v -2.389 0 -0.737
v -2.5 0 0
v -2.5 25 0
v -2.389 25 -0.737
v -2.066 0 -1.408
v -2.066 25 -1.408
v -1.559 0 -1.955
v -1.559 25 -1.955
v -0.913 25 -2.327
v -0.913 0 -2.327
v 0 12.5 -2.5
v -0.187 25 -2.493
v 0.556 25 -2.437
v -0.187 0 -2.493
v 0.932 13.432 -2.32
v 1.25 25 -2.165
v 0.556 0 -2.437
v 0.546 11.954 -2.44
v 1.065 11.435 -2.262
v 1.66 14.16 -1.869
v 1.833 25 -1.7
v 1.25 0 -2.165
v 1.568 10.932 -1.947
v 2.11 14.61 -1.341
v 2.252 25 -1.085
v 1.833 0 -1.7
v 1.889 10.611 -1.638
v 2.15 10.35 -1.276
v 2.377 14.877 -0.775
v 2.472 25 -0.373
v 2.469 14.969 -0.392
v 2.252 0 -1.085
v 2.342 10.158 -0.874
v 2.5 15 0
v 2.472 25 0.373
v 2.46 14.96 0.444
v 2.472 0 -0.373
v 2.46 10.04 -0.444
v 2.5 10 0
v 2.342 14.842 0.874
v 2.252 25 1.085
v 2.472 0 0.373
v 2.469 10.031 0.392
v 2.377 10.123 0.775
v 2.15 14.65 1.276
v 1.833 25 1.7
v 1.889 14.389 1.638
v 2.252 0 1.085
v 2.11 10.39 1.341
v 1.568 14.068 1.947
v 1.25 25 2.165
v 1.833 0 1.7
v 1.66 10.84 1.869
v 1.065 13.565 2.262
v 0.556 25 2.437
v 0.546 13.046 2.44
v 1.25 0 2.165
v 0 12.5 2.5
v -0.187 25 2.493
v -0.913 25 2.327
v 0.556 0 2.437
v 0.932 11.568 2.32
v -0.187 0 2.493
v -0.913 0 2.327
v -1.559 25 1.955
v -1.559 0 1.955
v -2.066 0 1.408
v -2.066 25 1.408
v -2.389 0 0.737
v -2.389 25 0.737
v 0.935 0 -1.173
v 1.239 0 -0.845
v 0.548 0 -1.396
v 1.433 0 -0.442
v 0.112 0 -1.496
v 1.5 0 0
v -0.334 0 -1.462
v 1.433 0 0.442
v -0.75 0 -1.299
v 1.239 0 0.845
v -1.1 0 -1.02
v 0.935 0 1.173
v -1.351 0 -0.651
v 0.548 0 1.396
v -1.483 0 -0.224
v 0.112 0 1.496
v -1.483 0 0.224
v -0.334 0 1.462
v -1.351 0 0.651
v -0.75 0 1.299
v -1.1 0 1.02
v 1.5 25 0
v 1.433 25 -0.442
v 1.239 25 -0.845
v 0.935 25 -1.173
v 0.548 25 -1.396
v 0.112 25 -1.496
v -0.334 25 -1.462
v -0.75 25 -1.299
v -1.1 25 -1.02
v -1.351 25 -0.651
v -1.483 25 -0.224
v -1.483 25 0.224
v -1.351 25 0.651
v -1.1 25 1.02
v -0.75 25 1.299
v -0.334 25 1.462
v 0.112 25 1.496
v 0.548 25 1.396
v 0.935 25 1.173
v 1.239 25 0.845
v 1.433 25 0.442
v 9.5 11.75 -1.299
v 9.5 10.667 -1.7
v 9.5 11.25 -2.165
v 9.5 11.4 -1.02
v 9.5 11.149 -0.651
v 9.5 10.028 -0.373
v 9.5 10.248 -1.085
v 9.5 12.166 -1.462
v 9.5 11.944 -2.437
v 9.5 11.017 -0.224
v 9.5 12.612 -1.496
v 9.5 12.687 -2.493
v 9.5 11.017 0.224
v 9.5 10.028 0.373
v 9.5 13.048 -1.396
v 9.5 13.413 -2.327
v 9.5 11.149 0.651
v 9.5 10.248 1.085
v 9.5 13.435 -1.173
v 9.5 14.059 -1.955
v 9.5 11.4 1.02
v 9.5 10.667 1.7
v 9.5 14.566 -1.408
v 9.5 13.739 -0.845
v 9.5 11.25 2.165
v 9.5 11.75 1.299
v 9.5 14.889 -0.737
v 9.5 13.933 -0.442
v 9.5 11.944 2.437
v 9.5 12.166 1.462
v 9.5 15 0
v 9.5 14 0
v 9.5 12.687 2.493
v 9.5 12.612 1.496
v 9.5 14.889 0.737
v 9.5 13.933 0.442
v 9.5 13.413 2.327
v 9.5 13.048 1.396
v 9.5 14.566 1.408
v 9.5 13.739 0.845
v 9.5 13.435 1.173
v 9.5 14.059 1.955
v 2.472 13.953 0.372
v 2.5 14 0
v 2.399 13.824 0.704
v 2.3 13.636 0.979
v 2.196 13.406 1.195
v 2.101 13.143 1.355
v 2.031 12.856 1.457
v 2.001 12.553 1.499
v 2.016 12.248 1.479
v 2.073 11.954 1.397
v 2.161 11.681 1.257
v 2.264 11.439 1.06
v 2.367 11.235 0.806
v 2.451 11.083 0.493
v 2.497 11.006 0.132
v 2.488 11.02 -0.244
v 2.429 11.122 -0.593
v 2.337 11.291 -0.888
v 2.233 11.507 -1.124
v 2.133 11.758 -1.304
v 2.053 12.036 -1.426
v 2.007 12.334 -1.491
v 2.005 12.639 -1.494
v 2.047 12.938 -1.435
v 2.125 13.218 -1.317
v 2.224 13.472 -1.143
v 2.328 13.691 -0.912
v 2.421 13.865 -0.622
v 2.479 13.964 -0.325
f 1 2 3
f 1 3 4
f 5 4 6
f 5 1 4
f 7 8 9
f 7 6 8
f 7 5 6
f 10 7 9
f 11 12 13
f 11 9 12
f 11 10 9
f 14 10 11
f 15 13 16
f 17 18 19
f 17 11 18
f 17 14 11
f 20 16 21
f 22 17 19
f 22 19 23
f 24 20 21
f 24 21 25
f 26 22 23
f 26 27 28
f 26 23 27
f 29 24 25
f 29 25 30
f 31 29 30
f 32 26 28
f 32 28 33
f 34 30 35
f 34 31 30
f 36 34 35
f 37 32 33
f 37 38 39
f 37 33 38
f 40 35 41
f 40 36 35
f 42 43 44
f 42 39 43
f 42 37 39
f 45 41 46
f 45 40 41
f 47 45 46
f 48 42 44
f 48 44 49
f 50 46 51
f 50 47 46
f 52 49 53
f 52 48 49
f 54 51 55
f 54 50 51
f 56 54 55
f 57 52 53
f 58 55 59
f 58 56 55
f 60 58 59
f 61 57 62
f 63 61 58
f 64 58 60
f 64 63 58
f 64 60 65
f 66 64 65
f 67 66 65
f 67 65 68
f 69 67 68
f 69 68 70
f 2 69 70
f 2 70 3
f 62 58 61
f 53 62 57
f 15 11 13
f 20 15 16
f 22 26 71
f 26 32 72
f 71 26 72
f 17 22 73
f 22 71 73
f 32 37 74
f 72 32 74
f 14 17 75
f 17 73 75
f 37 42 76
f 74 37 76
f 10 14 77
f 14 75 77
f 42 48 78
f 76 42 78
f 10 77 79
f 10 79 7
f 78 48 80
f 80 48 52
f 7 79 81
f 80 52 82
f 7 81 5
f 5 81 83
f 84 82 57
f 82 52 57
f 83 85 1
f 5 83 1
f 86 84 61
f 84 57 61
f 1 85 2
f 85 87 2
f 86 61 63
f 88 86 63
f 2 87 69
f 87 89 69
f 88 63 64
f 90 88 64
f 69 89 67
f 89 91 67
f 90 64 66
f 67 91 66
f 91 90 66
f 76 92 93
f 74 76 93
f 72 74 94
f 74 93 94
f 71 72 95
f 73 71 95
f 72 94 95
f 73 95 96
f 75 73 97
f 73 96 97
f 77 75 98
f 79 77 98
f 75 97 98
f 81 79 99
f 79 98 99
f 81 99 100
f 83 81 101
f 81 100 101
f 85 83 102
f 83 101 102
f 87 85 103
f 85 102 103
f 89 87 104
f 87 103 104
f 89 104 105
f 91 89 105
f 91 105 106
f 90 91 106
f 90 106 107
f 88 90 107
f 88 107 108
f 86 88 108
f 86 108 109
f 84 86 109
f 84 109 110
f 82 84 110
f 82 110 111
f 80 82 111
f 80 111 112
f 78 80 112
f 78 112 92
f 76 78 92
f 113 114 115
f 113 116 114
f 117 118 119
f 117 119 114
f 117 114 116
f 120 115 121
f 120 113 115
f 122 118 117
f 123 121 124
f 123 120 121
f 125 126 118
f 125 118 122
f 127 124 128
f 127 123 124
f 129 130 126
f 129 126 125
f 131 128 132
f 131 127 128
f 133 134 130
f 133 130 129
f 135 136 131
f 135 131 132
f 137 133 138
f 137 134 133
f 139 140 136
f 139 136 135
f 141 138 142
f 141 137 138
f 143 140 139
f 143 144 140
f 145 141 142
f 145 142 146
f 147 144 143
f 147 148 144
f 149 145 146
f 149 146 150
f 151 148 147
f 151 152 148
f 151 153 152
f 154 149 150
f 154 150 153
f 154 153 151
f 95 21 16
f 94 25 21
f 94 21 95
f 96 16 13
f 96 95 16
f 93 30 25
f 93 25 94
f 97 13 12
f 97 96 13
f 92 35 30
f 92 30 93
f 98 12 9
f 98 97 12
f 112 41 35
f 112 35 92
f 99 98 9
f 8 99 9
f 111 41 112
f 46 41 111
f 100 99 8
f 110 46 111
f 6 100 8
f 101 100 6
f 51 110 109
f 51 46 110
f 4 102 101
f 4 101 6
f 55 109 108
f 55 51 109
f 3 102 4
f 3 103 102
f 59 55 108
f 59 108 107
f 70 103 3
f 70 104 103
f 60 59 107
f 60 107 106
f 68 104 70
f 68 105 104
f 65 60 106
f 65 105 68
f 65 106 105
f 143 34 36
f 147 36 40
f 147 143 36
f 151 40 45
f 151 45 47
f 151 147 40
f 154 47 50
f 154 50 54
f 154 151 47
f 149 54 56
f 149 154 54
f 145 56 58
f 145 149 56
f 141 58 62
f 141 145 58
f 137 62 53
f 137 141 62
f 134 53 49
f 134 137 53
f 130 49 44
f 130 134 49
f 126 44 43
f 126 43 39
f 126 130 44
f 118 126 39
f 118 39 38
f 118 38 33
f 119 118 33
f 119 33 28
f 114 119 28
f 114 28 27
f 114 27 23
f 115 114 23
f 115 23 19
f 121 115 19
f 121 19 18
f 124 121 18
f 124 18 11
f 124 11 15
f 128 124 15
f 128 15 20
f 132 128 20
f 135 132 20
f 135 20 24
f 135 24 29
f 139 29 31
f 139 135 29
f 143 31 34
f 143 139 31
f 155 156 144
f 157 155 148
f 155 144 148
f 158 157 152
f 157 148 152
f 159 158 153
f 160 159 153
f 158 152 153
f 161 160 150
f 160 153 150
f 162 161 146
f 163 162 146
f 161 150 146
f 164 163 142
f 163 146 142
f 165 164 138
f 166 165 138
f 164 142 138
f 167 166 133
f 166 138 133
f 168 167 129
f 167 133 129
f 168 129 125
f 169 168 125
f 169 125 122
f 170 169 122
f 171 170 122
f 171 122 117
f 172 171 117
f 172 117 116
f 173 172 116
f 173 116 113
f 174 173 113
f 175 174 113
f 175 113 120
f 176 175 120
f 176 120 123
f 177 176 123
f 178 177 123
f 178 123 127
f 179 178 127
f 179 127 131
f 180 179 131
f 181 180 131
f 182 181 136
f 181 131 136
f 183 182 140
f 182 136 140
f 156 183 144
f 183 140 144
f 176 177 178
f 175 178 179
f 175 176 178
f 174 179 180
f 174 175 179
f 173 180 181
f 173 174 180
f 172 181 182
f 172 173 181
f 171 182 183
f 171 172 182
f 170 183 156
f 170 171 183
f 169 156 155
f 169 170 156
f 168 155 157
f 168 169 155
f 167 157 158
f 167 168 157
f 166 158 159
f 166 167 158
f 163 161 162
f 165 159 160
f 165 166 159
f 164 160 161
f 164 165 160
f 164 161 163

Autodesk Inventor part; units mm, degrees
ref_plane "XZ Plane" through (0, 0, 0) normal (0, 1, 0) x (-1, 0, 0)
ref_plane "XY Plane" through (0, 0, 0) normal (0, 0, 1) x (1, 0, 0)
sketch "Skizze1" plane through (0, 0, 0) normal (0, 1, 0) x (-1, 0, 0)
  circle A0 centre (0, 0) radius 2.5
  dimension "d0" = 5
extrude "Extrusion1" add sketch "Skizze1" along normal blind 25
sketch "Skizze2" plane through (0, 25, 0) normal (0, 1, 0) x (1, 0, 0)
  circle A0 centre (0, 0) radius 2.5 projected
  circle A1 centre (0, 0) radius 1.5
  dimension "d3" = 3
extrude "Extrusion2" cut sketch "Skizze2" against normal up to surface (25 mm away) contours A1
ref_plane "Arbeitsebene1" through (9.5, 0, 0) normal (1, 0, 0) x (0, 1, 0)
sketch "Skizze3" plane through (9.5, 0, 0) normal (1, 0, 0) x (0, 1, 0)
  circle A0 centre (12.5, 0) radius 2.5
  circle A1 centre (12.5, 0) radius 1.5
  point P0 (0, 0)
  dimension "d7" = 5
  dimension "d8" = 3
  dimension "d9" = 12.5
extrude "Extrusion3" add sketch "Skizze3" against normal up to surface
properties part number "divider" material "Messing, weicher Gelbton"
